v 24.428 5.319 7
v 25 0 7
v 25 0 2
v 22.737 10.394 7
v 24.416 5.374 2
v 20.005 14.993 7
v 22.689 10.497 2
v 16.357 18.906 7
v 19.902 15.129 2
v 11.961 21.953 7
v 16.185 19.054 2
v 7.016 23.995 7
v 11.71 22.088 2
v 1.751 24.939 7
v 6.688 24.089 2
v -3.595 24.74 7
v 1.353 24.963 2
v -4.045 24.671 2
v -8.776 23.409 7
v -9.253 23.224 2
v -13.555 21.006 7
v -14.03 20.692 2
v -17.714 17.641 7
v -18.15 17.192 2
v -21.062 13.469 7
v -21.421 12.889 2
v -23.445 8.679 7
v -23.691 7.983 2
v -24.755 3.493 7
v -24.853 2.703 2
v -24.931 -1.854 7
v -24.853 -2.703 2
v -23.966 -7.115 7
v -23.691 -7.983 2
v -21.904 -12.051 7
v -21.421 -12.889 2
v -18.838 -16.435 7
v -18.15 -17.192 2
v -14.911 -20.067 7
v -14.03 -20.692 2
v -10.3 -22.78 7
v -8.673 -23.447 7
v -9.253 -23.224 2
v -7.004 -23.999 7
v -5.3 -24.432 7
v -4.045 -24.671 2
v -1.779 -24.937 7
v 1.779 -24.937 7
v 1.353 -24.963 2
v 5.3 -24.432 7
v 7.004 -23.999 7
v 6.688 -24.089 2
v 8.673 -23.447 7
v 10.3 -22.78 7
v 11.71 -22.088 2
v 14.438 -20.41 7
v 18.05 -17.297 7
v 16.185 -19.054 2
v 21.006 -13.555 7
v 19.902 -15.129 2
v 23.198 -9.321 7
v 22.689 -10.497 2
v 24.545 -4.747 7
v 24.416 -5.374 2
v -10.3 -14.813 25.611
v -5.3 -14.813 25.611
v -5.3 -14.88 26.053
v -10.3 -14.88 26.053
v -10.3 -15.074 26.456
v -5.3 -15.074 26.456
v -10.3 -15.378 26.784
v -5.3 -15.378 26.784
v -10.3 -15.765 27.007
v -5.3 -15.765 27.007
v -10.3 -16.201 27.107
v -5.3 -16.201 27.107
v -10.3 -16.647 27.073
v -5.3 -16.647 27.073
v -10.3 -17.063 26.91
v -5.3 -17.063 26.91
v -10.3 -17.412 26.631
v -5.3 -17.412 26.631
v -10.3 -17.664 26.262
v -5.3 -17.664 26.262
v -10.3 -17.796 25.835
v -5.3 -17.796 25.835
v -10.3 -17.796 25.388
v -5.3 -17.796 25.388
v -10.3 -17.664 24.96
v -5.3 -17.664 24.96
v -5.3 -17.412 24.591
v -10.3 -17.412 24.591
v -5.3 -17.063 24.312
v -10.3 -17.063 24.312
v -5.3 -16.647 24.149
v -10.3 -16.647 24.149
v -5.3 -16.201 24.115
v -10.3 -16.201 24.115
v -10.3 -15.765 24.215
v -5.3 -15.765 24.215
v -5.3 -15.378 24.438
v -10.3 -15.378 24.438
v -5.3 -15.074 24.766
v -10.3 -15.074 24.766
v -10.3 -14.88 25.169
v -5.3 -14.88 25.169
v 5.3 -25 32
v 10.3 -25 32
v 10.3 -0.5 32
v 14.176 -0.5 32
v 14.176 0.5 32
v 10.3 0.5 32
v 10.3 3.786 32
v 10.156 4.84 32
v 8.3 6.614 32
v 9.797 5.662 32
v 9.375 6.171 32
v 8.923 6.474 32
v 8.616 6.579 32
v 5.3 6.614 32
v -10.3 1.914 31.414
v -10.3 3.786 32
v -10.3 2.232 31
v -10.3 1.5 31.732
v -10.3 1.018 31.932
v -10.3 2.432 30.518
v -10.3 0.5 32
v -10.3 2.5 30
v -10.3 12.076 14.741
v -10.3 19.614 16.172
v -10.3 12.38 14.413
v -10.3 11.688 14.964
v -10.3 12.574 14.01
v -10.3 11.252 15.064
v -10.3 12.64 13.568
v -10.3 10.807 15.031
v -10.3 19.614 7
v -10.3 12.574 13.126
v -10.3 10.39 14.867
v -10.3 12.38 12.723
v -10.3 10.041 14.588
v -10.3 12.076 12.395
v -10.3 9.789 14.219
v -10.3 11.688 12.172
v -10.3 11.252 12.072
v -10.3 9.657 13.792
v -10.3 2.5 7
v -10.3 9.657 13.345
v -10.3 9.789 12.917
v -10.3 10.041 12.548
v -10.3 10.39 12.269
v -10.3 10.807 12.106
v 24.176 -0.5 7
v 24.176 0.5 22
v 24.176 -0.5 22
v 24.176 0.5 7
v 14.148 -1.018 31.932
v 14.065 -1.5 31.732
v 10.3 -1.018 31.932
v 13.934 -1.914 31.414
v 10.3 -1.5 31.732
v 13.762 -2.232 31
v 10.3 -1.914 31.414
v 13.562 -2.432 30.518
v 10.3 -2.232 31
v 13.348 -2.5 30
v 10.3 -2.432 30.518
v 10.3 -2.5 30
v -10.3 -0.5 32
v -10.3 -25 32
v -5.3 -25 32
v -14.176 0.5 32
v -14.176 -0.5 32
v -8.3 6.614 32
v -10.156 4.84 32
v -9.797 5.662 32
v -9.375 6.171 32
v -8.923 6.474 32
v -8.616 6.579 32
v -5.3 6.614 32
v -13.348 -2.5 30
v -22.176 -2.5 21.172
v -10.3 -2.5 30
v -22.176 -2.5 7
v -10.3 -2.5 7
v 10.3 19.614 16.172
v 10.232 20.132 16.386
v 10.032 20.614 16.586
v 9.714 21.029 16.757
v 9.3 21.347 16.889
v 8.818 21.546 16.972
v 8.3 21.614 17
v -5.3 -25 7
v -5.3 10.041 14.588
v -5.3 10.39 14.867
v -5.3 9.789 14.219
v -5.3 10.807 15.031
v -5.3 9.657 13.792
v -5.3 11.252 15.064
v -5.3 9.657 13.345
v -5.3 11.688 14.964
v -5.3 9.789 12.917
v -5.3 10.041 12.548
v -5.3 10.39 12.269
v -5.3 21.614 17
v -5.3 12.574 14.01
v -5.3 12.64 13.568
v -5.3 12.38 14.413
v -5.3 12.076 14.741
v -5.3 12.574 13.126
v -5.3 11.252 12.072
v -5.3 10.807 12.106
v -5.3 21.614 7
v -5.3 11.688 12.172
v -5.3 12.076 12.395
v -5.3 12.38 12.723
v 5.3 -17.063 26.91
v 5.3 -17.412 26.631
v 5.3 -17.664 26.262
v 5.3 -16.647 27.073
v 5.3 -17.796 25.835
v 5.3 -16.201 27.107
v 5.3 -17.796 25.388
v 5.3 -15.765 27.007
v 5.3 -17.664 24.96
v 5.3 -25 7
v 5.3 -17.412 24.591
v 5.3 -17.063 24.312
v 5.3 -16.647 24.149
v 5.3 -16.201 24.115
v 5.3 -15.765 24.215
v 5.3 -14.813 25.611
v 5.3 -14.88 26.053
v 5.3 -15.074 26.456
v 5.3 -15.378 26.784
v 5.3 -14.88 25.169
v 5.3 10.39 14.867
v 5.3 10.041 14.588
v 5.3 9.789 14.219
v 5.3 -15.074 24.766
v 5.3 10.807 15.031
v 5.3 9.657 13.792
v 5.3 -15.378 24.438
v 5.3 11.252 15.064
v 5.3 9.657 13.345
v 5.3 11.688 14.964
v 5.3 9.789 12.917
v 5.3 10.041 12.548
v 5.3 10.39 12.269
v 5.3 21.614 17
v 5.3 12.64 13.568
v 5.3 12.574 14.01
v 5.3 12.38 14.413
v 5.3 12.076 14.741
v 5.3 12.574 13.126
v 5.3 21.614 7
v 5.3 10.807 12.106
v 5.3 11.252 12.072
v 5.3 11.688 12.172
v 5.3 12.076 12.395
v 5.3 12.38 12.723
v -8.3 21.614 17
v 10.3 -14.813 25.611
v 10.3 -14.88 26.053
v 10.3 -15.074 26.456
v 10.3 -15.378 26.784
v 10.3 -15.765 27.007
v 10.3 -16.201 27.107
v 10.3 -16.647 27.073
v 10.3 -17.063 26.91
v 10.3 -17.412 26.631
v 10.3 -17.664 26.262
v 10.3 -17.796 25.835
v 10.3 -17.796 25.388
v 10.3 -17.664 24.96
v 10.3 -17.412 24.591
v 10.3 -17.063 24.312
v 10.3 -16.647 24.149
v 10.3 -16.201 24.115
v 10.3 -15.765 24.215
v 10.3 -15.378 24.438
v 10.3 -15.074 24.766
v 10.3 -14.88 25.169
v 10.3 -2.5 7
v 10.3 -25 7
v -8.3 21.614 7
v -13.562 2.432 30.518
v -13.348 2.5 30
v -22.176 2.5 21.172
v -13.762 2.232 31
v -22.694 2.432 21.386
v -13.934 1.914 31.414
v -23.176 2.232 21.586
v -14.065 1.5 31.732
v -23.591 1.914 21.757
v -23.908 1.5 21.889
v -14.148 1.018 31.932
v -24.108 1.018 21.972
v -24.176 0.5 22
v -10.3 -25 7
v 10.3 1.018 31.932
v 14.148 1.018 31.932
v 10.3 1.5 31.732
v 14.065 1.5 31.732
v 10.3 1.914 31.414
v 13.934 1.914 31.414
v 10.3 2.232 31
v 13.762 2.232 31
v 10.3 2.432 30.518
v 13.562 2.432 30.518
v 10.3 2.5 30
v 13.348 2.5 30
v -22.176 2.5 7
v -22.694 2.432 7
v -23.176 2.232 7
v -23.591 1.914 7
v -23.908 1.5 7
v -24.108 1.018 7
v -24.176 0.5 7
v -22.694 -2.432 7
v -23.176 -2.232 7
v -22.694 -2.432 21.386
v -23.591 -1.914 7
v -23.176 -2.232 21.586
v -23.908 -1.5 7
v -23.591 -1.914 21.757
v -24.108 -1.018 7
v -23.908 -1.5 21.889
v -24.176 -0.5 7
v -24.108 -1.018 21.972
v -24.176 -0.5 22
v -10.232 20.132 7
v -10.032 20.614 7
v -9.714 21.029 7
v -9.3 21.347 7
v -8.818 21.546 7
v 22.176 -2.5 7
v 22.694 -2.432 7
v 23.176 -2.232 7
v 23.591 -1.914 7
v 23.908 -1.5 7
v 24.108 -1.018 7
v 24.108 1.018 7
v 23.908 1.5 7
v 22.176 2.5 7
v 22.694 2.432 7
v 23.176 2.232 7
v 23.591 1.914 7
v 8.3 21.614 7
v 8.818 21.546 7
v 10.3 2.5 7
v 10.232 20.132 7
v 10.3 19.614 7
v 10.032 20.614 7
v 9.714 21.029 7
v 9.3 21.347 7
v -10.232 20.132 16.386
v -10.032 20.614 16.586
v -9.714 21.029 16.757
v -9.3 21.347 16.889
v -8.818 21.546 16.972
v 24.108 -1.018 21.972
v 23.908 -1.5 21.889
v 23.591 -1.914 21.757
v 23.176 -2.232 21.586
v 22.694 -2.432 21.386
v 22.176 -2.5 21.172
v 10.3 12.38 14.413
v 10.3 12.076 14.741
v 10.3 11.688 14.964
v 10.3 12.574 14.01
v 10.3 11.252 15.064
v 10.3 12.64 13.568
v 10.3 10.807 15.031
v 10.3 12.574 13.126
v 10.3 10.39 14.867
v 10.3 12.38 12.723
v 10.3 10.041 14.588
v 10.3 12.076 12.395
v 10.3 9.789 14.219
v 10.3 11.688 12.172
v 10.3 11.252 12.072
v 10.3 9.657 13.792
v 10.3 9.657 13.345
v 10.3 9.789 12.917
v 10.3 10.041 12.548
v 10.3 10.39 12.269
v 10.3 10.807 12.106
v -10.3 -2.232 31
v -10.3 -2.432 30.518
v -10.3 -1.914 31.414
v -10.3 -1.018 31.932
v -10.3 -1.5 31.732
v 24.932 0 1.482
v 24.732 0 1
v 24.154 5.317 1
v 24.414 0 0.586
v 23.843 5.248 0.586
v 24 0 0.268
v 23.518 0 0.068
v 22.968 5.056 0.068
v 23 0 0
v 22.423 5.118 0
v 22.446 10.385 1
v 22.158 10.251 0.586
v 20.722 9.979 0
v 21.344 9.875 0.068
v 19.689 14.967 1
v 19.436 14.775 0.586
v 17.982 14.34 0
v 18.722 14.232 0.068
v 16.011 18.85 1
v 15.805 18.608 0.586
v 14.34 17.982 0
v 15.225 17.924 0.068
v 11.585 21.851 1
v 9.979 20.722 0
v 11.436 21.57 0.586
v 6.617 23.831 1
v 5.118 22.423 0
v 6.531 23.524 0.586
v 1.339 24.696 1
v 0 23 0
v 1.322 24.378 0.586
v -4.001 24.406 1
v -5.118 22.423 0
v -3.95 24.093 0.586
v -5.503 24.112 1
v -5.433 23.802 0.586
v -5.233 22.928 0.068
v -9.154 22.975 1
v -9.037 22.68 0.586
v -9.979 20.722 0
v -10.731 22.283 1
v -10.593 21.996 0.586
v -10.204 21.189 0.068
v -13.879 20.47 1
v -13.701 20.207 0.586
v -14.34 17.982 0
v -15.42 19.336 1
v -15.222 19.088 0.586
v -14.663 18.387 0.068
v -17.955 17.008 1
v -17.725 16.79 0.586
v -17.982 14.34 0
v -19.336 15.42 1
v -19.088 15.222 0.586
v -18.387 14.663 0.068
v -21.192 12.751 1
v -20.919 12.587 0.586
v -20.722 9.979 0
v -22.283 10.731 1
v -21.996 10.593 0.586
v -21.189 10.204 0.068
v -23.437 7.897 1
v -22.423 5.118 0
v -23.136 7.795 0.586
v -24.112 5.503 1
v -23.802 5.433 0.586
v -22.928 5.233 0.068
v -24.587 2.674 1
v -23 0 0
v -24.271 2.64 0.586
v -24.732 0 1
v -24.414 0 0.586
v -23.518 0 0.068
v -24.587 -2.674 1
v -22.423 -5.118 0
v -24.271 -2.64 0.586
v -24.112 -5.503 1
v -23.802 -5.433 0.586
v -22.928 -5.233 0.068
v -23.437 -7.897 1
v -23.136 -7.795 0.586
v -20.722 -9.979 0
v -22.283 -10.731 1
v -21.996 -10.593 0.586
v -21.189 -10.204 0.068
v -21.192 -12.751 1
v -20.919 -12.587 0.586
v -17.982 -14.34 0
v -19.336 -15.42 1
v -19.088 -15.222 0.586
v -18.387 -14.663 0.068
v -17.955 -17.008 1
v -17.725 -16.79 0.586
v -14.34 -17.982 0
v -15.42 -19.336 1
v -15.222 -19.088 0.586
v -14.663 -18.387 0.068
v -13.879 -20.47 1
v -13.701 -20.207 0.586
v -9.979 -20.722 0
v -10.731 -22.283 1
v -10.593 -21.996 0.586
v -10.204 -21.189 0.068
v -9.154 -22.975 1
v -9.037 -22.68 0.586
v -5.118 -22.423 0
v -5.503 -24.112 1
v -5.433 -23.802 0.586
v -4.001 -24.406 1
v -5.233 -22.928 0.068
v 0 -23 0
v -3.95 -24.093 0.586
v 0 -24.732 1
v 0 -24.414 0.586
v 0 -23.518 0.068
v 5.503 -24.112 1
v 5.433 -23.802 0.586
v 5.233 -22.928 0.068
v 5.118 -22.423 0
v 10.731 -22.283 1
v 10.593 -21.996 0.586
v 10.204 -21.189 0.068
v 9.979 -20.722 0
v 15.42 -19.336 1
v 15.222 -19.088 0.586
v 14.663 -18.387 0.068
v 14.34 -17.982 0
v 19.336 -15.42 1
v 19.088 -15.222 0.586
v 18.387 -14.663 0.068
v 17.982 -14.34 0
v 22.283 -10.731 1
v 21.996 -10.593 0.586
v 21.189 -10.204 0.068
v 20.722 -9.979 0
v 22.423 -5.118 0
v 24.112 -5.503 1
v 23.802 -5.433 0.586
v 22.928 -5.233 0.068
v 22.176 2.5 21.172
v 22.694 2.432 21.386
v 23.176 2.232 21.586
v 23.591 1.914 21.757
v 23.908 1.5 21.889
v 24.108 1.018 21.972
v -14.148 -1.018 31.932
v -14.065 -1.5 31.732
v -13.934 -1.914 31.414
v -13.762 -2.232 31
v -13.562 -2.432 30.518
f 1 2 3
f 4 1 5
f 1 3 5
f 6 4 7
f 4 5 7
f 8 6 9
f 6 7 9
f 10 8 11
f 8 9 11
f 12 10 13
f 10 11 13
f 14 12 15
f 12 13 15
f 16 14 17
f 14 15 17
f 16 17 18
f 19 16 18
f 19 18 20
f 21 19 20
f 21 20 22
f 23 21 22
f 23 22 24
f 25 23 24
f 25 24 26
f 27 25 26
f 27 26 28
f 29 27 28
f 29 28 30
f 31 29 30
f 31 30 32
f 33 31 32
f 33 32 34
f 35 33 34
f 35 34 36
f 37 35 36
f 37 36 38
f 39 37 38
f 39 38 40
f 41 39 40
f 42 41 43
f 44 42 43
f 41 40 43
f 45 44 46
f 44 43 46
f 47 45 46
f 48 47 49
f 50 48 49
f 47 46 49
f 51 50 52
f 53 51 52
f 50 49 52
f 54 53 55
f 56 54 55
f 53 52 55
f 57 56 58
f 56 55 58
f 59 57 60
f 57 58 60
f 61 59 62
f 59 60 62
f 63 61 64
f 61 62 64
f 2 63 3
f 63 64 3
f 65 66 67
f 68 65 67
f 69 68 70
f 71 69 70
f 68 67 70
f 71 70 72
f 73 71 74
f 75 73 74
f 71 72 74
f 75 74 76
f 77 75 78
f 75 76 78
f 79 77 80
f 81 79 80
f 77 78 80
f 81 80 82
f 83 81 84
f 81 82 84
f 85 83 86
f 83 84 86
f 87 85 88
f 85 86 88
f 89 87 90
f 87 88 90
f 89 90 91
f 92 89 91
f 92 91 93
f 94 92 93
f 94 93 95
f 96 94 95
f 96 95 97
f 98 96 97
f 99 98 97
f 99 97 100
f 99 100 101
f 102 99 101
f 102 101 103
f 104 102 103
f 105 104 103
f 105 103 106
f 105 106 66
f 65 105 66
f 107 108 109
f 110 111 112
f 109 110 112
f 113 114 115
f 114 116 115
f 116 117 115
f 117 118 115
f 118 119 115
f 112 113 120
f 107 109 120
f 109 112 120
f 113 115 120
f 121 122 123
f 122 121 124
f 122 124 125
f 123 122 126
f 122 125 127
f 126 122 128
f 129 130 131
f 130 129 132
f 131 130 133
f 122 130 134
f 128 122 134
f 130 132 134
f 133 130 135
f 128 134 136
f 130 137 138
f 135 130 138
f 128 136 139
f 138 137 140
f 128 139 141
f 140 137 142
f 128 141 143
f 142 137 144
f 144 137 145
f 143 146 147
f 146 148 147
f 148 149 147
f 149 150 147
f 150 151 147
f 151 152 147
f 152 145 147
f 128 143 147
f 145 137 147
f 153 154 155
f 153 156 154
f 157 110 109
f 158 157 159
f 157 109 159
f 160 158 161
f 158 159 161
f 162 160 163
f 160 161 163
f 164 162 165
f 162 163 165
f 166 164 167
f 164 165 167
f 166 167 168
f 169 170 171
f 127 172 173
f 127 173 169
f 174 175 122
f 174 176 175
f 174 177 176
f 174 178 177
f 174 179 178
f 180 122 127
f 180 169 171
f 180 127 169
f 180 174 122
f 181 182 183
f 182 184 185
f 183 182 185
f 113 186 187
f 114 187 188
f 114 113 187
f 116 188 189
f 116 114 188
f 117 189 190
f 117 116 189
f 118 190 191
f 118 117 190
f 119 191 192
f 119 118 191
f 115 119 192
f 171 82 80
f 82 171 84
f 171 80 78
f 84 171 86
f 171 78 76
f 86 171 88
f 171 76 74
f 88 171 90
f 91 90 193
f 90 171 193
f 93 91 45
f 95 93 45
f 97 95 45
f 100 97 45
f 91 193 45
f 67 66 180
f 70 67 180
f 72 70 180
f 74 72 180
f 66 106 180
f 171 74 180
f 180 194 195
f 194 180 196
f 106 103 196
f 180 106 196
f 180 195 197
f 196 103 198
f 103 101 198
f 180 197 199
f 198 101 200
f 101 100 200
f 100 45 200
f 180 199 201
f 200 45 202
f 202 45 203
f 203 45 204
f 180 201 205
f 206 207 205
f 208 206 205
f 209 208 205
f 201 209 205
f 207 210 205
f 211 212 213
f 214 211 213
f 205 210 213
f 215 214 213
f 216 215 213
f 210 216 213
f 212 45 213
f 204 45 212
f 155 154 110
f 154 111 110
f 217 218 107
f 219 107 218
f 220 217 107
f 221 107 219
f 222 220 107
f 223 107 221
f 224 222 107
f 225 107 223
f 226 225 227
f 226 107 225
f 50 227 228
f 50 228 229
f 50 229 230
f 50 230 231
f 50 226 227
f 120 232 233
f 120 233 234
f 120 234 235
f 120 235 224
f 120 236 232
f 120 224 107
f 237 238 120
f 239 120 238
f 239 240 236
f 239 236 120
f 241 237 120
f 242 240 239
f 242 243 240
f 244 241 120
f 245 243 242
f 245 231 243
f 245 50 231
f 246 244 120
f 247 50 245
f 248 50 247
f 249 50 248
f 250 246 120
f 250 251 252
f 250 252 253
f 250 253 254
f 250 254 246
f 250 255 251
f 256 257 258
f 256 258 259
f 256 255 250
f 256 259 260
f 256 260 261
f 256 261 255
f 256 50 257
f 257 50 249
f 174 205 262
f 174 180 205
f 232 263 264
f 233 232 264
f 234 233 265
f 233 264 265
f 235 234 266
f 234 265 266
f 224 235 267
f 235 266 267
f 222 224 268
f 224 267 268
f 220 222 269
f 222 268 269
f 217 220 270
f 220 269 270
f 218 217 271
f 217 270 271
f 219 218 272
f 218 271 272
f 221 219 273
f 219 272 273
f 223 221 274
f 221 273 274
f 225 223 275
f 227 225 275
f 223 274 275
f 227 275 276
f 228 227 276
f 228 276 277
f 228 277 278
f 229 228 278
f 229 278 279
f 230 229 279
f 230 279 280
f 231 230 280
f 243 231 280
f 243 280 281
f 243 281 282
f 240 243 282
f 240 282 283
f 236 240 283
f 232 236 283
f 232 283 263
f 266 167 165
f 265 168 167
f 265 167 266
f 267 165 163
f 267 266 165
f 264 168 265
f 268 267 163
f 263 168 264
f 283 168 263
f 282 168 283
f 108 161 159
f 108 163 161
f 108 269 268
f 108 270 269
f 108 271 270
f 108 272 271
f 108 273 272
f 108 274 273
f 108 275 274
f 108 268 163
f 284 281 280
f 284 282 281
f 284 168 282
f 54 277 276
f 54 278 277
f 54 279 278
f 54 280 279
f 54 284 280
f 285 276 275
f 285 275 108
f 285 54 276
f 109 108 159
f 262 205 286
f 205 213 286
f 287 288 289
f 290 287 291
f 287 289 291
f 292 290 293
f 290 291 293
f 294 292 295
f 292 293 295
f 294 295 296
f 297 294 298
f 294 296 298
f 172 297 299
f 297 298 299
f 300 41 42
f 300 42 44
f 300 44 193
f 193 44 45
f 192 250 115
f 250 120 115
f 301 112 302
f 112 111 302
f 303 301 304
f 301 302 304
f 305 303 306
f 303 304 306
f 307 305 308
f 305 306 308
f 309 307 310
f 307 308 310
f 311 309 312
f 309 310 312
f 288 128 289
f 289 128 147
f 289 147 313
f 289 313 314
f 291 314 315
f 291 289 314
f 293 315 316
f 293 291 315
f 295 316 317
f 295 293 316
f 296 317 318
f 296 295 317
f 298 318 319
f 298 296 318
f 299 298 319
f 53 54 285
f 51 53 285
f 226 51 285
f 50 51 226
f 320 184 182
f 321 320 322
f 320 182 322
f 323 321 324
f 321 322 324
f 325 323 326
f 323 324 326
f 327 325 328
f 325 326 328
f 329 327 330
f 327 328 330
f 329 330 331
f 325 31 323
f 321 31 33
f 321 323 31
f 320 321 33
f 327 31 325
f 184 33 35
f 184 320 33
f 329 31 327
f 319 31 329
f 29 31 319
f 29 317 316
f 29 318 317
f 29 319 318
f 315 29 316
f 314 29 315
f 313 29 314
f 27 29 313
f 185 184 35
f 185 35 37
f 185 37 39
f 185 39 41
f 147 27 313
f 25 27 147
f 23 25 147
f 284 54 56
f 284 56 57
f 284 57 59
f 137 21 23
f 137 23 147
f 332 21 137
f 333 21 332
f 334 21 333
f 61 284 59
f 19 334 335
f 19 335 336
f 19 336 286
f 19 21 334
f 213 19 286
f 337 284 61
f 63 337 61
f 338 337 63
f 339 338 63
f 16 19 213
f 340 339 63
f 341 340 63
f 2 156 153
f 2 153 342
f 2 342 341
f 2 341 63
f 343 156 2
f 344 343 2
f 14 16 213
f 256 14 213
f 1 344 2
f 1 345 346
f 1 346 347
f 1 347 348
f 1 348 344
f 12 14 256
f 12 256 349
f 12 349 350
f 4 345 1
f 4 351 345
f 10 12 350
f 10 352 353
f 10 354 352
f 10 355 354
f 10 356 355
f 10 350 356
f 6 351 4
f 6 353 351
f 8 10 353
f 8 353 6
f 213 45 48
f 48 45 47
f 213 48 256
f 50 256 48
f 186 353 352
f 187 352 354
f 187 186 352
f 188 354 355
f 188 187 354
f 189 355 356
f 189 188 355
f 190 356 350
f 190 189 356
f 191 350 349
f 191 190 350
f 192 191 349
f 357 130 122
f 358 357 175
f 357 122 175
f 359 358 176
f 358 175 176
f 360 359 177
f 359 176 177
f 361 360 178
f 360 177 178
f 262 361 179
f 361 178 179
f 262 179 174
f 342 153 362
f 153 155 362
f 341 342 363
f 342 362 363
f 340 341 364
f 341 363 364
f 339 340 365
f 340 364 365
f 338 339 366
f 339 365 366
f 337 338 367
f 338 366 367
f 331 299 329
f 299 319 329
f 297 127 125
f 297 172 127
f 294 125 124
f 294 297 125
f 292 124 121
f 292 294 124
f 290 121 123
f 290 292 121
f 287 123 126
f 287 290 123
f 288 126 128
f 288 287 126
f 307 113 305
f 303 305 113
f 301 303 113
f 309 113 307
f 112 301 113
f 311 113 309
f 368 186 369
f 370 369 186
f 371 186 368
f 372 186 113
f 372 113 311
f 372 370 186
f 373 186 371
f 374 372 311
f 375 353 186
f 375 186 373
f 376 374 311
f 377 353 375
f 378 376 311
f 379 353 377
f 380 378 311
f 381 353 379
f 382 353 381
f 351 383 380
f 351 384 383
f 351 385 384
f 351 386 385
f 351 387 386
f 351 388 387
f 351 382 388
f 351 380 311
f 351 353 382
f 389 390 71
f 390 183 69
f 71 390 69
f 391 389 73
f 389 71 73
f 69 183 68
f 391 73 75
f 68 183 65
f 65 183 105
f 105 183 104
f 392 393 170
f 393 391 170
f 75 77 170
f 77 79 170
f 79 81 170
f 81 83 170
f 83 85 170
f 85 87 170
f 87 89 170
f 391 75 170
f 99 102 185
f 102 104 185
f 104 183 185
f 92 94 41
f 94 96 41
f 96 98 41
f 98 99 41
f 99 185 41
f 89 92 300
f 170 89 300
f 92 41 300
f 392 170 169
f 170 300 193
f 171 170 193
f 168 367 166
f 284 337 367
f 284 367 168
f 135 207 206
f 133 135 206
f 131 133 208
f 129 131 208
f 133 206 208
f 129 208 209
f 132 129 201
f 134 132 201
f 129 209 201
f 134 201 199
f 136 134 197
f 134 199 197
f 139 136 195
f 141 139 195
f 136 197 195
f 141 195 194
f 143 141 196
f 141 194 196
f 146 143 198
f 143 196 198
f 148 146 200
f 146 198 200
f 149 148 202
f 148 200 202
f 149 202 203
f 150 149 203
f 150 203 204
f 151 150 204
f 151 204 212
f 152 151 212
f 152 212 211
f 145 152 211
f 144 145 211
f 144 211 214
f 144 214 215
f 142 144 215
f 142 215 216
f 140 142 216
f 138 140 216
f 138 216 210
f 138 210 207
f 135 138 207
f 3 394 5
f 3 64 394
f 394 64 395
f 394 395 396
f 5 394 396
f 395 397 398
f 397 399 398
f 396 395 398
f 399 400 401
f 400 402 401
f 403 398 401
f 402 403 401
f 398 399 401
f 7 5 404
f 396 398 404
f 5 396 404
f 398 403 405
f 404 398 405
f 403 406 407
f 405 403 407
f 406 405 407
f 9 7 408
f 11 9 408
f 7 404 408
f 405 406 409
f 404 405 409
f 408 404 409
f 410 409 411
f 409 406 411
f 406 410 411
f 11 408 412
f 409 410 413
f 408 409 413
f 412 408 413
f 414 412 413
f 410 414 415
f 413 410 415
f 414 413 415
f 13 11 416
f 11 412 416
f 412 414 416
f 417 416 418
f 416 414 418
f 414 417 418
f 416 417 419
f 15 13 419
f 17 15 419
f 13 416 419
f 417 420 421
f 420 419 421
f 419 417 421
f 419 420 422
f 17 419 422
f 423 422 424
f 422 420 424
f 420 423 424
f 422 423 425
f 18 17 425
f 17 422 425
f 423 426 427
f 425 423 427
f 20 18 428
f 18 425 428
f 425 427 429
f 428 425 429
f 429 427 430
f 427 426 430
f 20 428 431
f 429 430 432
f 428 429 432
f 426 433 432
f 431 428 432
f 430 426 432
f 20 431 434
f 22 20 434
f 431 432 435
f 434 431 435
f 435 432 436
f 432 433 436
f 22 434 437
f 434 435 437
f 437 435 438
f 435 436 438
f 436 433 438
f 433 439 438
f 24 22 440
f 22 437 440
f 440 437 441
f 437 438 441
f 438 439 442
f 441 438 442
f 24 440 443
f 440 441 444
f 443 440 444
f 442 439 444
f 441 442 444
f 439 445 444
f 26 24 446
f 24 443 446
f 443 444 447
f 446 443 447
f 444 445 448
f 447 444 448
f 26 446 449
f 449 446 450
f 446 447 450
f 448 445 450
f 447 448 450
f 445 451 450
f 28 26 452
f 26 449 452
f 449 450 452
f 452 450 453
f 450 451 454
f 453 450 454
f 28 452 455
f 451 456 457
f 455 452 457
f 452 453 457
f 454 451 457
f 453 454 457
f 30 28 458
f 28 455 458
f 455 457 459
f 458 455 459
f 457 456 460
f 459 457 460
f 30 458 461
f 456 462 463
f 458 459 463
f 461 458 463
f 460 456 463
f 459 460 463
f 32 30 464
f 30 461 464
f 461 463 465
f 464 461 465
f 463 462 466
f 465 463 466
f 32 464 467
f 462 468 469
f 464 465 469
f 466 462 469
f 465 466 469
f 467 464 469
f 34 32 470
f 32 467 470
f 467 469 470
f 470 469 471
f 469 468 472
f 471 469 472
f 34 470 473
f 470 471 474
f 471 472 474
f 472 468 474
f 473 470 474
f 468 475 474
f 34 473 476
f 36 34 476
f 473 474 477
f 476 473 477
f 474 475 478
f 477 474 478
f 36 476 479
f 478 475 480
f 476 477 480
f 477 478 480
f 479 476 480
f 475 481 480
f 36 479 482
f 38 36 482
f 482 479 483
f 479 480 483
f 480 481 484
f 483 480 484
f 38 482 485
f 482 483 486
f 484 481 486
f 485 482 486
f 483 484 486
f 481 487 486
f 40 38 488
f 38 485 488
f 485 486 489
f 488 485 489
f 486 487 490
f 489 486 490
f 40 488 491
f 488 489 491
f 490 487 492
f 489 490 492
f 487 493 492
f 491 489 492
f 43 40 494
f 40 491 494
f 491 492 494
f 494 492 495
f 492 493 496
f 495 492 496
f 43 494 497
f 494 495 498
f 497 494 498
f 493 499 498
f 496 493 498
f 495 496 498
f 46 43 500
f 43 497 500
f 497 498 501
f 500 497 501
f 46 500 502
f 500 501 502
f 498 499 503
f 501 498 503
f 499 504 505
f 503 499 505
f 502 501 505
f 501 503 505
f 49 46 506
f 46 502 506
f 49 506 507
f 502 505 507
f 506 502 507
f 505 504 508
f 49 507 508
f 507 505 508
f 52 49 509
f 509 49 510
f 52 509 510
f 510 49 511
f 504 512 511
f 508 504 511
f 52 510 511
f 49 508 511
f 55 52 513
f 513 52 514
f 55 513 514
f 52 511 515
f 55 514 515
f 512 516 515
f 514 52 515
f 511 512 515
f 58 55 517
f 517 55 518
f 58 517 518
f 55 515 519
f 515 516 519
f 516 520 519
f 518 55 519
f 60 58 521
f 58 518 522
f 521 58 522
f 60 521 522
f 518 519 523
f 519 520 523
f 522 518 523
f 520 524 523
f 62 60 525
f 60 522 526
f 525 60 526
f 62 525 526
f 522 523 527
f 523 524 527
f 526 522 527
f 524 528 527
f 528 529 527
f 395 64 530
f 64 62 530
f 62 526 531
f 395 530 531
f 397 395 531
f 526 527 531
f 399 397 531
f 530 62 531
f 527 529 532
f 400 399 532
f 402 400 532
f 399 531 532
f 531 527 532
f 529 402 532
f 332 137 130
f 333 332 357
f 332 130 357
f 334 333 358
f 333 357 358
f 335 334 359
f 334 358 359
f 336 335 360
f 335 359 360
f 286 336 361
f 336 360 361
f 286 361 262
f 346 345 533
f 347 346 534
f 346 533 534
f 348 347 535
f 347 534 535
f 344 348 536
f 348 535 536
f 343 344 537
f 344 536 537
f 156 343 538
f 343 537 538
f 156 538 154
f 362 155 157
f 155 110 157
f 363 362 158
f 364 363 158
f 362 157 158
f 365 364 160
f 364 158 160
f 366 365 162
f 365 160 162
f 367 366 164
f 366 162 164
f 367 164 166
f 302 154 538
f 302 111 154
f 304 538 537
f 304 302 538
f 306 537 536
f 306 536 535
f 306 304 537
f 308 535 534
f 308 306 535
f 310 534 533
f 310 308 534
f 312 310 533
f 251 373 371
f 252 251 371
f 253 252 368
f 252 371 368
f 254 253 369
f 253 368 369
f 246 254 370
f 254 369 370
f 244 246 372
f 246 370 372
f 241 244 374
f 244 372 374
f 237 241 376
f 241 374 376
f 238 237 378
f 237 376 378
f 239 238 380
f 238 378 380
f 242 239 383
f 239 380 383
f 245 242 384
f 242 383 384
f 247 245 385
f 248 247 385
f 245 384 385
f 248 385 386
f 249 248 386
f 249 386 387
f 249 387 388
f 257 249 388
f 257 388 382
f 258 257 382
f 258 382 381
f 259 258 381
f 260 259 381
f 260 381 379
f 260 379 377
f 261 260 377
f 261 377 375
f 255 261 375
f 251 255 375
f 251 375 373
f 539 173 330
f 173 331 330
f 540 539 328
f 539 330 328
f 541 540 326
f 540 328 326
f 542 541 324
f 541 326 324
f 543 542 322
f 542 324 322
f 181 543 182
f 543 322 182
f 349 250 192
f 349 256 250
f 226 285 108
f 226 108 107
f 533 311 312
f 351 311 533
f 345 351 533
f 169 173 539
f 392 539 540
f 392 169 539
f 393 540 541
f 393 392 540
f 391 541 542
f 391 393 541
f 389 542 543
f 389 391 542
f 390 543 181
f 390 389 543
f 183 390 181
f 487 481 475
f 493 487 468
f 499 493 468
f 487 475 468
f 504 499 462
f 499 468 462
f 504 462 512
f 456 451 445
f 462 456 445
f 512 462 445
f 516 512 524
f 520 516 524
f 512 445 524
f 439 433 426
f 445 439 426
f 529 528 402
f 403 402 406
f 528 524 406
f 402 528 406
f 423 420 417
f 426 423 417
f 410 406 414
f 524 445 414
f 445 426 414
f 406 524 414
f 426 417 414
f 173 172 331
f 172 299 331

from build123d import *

# Parameters (mm, degrees)
SKETCH_R        = 25
PAD_DEPTH       = 7
PAD001_DEPTH    = 25
CHAMFER_SIZE    = 15
CHAMFER001_SIZE = 10
FILLET_R        = 2
FILLET001_R     = 2
FILLET002_R     = 2
SKETCH002_R     = 1.5
POCKET_DEPTH    = 35.301
FILLET003_R     = 2


with BuildPart() as part:
    # Sketch → Pad (new body)
    with BuildSketch(Plane.XY):
        Circle(SKETCH_R)
    extrude(amount=PAD_DEPTH)

    # Sketch001 → Pad001 (new body)
    with BuildSketch(Plane.XY.offset(7)):
        Polygon((5.3, 21.614464), (10.3, 21.614464), (10.3, 2.5), (24.176399, 2.5), (24.176399, -2.5), (10.3, -2.5), (10.3, -25), (5.3, -25), align=None)
    pad001 = extrude(amount=PAD001_DEPTH)

    # Mirrored: Pad001 across Sketch001 V_Axis
    add(pad001.mirror(Plane(origin=(0, 0, 7), x_dir=(0, 0, 1), z_dir=(1, 0, 0))))

    # Chamfer
    chamfer_edges = [part.edges().sort_by_distance(p)[0] for p in [
        (7.8, 21.614464, 32),
        (-7.8, 21.614464, 32),
    ]]
    chamfer(chamfer_edges, length=CHAMFER_SIZE)

    # Chamfer001
    chamfer001_edges = [part.edges().sort_by_distance(p)[0] for p in [
        (24.176399, 0, 32),
        (-24.176399, 0, 32),
    ]]
    chamfer(chamfer001_edges, length=CHAMFER001_SIZE)

    # Fillet
    fillet_edges = [part.edges().sort_by_distance(p)[0] for p in [
        (10.3, 14.114464, 24.5),
        (10.3, 21.614464, 12),
        (-10.3, 14.114464, 24.5),
        (-10.3, 21.614464, 12),
    ]]
    fillet(fillet_edges, radius=FILLET_R)

    # Fillet001
    fillet001_edges = [part.edges().sort_by_distance(p)[0] for p in [
        (-19.176399, 2.5, 27),
        (-24.176399, 2.5, 14.5),
        (-19.176399, -2.5, 27),
        (-24.176399, -2.5, 14.5),
        (-12.2382, 2.5, 32),
        (-12.2382, -2.5, 32),
    ]]
    fillet(fillet001_edges, radius=FILLET001_R)

    # Fillet002
    fillet002_edges = [part.edges().sort_by_distance(p)[0] for p in [
        (12.2382, 2.5, 32),
        (19.176399, 2.5, 27),
        (24.176399, 2.5, 14.5),
        (24.176399, -2.5, 14.5),
        (19.176399, -2.5, 27),
        (12.2382, -2.5, 32),
    ]]
    fillet(fillet002_edges, radius=FILLET002_R)

    # Sketch002 → Pocket (cut, through all)
    with BuildSketch(Plane.YZ.offset(10.3)):
        with Locations((11.140296, 13.568136)):
            Circle(SKETCH002_R)
        with Locations((-16.31287, 25.611097)):
            Circle(SKETCH002_R)
    extrude(amount=-POCKET_DEPTH, mode=Mode.SUBTRACT)

    # Fillet003
    fillet003_edges = [part.edges().sort_by_distance(p)[0] for p in [
        (-25, 0, 0),
    ]]
    fillet(fillet003_edges, radius=FILLET003_R)


solid = part.part
